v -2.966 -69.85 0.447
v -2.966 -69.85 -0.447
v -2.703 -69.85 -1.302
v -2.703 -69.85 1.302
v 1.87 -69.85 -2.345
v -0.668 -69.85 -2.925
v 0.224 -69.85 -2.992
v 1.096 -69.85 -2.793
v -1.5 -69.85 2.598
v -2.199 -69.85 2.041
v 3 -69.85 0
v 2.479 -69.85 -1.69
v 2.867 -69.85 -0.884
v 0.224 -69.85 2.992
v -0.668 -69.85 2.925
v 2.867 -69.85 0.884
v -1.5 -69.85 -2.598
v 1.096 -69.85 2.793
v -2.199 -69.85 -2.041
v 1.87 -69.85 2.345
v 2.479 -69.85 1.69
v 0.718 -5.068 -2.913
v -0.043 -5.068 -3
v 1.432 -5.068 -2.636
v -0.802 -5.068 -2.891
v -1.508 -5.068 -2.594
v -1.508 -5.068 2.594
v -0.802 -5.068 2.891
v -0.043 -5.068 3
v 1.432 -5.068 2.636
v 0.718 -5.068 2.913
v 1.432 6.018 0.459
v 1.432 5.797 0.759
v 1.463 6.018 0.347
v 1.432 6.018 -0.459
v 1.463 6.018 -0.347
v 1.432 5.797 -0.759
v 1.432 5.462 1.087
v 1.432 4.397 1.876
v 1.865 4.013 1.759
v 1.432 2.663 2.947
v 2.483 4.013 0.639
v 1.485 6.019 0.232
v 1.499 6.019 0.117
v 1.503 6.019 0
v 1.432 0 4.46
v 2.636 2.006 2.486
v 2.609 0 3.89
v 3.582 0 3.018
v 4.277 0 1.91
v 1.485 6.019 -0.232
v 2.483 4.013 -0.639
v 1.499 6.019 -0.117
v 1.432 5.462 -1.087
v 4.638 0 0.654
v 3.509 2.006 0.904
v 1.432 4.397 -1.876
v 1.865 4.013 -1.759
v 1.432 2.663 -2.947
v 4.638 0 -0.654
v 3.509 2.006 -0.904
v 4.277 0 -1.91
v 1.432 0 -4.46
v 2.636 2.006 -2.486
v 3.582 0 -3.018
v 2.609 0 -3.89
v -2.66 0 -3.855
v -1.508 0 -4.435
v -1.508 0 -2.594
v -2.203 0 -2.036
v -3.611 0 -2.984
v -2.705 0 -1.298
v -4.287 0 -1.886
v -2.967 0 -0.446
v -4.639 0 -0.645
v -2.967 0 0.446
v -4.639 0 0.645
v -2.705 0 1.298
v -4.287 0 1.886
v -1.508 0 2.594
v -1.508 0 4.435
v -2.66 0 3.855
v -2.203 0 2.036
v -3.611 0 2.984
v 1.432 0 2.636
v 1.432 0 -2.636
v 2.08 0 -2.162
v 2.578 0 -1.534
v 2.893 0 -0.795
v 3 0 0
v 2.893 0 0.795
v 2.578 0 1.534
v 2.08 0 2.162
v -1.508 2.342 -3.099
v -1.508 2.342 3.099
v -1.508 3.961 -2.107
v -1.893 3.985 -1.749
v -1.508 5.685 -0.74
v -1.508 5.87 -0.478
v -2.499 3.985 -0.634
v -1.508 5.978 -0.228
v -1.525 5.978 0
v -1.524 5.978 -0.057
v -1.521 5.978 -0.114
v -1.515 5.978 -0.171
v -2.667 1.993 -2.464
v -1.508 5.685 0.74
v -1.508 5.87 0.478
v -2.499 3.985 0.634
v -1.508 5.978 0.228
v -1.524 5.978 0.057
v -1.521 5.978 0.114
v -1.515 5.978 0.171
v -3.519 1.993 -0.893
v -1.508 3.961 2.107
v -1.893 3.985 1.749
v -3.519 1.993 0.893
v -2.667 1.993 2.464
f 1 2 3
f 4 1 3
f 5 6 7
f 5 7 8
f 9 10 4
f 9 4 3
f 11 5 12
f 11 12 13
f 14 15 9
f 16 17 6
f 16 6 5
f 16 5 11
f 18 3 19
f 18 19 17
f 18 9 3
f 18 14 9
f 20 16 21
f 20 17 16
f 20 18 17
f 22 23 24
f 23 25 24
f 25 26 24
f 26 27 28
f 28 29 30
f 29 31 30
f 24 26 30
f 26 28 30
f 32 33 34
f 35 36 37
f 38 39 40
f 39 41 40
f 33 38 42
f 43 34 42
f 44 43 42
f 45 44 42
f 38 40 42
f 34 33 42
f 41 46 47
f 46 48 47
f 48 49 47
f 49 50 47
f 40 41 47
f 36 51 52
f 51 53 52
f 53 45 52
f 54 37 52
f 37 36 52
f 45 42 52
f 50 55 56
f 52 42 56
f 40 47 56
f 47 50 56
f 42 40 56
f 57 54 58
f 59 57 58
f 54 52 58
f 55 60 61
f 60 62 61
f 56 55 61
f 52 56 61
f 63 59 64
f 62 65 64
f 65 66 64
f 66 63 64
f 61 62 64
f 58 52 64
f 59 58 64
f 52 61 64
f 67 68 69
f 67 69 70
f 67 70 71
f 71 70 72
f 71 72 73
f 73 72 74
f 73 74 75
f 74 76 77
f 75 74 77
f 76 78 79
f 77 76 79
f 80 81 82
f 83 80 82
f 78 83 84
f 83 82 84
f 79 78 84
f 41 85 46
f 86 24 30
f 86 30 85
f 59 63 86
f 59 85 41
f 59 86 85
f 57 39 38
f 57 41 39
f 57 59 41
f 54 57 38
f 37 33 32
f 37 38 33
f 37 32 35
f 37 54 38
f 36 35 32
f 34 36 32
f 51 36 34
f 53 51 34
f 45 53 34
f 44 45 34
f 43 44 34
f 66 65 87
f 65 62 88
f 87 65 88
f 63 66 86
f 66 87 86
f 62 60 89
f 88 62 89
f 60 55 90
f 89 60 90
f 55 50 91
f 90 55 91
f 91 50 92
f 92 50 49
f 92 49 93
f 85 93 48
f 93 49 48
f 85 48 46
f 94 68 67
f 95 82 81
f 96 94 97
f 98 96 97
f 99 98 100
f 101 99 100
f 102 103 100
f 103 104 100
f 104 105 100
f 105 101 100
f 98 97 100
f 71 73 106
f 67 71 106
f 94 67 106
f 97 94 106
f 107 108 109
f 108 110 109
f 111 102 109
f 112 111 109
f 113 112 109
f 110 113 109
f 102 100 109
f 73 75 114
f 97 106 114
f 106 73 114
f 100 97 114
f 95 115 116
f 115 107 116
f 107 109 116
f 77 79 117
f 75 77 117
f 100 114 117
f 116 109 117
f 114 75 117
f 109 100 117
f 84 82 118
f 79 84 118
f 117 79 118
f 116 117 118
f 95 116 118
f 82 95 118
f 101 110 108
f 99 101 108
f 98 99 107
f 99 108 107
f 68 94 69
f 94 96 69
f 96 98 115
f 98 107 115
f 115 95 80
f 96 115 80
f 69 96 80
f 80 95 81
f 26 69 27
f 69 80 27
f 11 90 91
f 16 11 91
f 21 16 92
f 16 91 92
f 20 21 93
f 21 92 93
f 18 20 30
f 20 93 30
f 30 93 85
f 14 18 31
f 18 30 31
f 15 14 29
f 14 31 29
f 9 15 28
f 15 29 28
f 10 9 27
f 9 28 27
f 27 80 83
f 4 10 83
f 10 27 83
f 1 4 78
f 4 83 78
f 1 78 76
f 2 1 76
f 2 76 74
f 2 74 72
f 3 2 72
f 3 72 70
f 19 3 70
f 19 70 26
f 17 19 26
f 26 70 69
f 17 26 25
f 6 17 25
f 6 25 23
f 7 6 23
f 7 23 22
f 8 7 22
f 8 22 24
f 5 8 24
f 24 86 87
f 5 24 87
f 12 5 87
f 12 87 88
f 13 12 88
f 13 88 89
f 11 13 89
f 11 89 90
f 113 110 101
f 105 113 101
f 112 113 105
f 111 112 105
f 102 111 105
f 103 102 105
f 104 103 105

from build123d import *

# Parameters (mm, degrees)
F0_R     = 3
F1_DEPTH = 69.85
F5_DEPTH = 25
F6_DEPTH = 10.9
F8_DEPTH = 25
F9_DEPTH = 25


with BuildPart() as f1:
    # F0 (on Front) → F1 (new body)
    with BuildSketch(Plane.XZ):
        Circle(F0_R)
    extrude(amount=F1_DEPTH)

    # F2 (on Top) → F3 (revolve)
    with BuildSketch(Plane.XY):
        Polygon((-4.683842, 0), (0, 0), (0, 8.863604), align=None)
    revolve(axis=Axis((0, 4.431802, 0), (0, 1, 0)))

    # F4 (on Top) → F5 (cut)
    with BuildSketch(Plane.XY):
        Polygon((1.431932, 6.093189), (-1.507714, 6.047257), (-1.507714, -5.068278), (1.431932, -5.068278), align=None)
    extrude(amount=-F5_DEPTH, mode=Mode.SUBTRACT)

    # F4 (on Top) → F6 (cut)
    with BuildSketch(Plane.XY):
        Polygon((1.431932, 6.093189), (-1.507714, 6.047257), (-1.507714, -5.068278), (1.431932, -5.068278), align=None)
    extrude(amount=F6_DEPTH, mode=Mode.SUBTRACT)

    # F7 (on Top) → F8 (cut)
    with BuildSketch(Plane.XY):
        Polygon((0, 8.892538), (-1.547059, 5.977397), (1.504442, 6.018774), align=None)
    extrude(amount=-F8_DEPTH, mode=Mode.SUBTRACT)

    # F7 (on Top) → F9 (cut)
    with BuildSketch(Plane.XY):
        Polygon((0, 8.892538), (-1.547059, 5.977397), (1.504442, 6.018774), align=None)
    extrude(amount=F9_DEPTH, mode=Mode.SUBTRACT)


solid = f1.part
